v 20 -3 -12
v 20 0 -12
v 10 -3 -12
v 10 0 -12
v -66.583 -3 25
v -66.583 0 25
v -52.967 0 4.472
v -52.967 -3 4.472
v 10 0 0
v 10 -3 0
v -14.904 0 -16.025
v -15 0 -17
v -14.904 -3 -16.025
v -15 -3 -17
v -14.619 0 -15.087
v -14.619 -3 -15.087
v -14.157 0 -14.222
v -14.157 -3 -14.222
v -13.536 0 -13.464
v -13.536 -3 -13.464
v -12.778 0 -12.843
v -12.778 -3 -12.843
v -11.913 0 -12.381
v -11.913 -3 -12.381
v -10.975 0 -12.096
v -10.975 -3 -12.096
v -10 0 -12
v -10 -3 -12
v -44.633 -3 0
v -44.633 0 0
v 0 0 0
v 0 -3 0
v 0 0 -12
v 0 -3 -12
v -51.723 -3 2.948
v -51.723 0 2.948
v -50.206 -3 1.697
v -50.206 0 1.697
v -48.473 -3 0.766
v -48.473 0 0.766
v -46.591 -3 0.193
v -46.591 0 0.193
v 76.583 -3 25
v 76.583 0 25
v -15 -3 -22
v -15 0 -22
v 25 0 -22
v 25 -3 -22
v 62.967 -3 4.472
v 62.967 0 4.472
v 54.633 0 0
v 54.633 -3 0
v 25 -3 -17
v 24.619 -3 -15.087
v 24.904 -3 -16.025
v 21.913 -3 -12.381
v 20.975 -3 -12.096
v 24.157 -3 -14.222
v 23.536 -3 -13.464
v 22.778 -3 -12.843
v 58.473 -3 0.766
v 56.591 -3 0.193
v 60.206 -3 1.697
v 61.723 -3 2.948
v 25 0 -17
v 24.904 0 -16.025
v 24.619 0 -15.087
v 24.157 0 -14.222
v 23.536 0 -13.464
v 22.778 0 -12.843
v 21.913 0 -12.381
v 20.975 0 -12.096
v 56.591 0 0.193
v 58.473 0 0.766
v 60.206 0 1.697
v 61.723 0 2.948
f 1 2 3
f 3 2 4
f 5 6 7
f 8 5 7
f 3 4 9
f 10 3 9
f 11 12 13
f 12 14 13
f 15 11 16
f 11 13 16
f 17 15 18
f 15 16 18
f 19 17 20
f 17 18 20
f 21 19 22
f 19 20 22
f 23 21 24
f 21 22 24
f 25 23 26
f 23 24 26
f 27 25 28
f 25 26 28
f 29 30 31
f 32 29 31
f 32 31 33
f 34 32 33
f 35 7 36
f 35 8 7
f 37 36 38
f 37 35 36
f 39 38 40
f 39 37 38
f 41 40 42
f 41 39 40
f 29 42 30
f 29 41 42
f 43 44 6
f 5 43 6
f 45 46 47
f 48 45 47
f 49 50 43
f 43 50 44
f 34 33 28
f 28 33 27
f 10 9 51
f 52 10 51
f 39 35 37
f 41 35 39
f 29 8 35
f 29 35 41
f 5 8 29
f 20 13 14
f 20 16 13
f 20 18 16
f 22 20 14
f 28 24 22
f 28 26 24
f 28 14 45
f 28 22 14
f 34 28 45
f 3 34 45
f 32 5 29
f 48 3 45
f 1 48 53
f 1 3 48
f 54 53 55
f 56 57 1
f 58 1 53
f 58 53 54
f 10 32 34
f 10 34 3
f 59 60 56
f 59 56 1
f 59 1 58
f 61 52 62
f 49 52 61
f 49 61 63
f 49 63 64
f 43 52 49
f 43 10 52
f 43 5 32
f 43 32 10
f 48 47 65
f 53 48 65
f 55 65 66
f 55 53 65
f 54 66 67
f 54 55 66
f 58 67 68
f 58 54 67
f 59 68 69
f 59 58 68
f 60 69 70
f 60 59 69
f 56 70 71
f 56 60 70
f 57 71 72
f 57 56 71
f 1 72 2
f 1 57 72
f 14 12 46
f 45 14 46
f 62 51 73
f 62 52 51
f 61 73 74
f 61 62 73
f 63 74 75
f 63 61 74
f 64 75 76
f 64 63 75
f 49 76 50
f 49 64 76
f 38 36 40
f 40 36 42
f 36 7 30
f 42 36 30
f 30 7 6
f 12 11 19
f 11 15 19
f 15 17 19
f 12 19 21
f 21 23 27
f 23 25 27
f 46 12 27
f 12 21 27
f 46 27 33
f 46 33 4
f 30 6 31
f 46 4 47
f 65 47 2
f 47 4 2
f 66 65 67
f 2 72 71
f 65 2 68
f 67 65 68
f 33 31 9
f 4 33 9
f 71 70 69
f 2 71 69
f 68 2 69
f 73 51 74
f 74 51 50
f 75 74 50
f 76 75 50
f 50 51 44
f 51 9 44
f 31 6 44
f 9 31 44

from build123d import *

# Parameters (mm, degrees)
F1_DEPTH = 3
F2_R     = 5
F3_R     = 5
F4_R     = 10
F5_R     = 10


with BuildPart() as f1:
    # F0 (on Front) → F1 (new body)
    with BuildSketch(Plane.XZ):
        Polygon((-50, 0), (0, 0), (0, -12), (-15, -12), (-15, -22), (25, -22), (25, -12), (10, -12), (10, 0), (60, 0), (76.583124, 25), (-66.583124, 25), align=None)
    extrude(amount=F1_DEPTH)

    # F2
    f2_edges = [f1.edges().sort_by_distance(p)[0] for p in [
        (25, -1.5, -12),
    ]]
    fillet(f2_edges, radius=F2_R)

    # F3
    f3_edges = [f1.edges().sort_by_distance(p)[0] for p in [
        (-15, -1.5, -12),
    ]]
    fillet(f3_edges, radius=F3_R)

    # F4
    f4_edges = [f1.edges().sort_by_distance(p)[0] for p in [
        (60, -1.5, 0),
    ]]
    fillet(f4_edges, radius=F4_R)

    # F5
    f5_edges = [f1.edges().sort_by_distance(p)[0] for p in [
        (-50, -1.5, 0),
    ]]
    fillet(f5_edges, radius=F5_R)


solid = f1.part
